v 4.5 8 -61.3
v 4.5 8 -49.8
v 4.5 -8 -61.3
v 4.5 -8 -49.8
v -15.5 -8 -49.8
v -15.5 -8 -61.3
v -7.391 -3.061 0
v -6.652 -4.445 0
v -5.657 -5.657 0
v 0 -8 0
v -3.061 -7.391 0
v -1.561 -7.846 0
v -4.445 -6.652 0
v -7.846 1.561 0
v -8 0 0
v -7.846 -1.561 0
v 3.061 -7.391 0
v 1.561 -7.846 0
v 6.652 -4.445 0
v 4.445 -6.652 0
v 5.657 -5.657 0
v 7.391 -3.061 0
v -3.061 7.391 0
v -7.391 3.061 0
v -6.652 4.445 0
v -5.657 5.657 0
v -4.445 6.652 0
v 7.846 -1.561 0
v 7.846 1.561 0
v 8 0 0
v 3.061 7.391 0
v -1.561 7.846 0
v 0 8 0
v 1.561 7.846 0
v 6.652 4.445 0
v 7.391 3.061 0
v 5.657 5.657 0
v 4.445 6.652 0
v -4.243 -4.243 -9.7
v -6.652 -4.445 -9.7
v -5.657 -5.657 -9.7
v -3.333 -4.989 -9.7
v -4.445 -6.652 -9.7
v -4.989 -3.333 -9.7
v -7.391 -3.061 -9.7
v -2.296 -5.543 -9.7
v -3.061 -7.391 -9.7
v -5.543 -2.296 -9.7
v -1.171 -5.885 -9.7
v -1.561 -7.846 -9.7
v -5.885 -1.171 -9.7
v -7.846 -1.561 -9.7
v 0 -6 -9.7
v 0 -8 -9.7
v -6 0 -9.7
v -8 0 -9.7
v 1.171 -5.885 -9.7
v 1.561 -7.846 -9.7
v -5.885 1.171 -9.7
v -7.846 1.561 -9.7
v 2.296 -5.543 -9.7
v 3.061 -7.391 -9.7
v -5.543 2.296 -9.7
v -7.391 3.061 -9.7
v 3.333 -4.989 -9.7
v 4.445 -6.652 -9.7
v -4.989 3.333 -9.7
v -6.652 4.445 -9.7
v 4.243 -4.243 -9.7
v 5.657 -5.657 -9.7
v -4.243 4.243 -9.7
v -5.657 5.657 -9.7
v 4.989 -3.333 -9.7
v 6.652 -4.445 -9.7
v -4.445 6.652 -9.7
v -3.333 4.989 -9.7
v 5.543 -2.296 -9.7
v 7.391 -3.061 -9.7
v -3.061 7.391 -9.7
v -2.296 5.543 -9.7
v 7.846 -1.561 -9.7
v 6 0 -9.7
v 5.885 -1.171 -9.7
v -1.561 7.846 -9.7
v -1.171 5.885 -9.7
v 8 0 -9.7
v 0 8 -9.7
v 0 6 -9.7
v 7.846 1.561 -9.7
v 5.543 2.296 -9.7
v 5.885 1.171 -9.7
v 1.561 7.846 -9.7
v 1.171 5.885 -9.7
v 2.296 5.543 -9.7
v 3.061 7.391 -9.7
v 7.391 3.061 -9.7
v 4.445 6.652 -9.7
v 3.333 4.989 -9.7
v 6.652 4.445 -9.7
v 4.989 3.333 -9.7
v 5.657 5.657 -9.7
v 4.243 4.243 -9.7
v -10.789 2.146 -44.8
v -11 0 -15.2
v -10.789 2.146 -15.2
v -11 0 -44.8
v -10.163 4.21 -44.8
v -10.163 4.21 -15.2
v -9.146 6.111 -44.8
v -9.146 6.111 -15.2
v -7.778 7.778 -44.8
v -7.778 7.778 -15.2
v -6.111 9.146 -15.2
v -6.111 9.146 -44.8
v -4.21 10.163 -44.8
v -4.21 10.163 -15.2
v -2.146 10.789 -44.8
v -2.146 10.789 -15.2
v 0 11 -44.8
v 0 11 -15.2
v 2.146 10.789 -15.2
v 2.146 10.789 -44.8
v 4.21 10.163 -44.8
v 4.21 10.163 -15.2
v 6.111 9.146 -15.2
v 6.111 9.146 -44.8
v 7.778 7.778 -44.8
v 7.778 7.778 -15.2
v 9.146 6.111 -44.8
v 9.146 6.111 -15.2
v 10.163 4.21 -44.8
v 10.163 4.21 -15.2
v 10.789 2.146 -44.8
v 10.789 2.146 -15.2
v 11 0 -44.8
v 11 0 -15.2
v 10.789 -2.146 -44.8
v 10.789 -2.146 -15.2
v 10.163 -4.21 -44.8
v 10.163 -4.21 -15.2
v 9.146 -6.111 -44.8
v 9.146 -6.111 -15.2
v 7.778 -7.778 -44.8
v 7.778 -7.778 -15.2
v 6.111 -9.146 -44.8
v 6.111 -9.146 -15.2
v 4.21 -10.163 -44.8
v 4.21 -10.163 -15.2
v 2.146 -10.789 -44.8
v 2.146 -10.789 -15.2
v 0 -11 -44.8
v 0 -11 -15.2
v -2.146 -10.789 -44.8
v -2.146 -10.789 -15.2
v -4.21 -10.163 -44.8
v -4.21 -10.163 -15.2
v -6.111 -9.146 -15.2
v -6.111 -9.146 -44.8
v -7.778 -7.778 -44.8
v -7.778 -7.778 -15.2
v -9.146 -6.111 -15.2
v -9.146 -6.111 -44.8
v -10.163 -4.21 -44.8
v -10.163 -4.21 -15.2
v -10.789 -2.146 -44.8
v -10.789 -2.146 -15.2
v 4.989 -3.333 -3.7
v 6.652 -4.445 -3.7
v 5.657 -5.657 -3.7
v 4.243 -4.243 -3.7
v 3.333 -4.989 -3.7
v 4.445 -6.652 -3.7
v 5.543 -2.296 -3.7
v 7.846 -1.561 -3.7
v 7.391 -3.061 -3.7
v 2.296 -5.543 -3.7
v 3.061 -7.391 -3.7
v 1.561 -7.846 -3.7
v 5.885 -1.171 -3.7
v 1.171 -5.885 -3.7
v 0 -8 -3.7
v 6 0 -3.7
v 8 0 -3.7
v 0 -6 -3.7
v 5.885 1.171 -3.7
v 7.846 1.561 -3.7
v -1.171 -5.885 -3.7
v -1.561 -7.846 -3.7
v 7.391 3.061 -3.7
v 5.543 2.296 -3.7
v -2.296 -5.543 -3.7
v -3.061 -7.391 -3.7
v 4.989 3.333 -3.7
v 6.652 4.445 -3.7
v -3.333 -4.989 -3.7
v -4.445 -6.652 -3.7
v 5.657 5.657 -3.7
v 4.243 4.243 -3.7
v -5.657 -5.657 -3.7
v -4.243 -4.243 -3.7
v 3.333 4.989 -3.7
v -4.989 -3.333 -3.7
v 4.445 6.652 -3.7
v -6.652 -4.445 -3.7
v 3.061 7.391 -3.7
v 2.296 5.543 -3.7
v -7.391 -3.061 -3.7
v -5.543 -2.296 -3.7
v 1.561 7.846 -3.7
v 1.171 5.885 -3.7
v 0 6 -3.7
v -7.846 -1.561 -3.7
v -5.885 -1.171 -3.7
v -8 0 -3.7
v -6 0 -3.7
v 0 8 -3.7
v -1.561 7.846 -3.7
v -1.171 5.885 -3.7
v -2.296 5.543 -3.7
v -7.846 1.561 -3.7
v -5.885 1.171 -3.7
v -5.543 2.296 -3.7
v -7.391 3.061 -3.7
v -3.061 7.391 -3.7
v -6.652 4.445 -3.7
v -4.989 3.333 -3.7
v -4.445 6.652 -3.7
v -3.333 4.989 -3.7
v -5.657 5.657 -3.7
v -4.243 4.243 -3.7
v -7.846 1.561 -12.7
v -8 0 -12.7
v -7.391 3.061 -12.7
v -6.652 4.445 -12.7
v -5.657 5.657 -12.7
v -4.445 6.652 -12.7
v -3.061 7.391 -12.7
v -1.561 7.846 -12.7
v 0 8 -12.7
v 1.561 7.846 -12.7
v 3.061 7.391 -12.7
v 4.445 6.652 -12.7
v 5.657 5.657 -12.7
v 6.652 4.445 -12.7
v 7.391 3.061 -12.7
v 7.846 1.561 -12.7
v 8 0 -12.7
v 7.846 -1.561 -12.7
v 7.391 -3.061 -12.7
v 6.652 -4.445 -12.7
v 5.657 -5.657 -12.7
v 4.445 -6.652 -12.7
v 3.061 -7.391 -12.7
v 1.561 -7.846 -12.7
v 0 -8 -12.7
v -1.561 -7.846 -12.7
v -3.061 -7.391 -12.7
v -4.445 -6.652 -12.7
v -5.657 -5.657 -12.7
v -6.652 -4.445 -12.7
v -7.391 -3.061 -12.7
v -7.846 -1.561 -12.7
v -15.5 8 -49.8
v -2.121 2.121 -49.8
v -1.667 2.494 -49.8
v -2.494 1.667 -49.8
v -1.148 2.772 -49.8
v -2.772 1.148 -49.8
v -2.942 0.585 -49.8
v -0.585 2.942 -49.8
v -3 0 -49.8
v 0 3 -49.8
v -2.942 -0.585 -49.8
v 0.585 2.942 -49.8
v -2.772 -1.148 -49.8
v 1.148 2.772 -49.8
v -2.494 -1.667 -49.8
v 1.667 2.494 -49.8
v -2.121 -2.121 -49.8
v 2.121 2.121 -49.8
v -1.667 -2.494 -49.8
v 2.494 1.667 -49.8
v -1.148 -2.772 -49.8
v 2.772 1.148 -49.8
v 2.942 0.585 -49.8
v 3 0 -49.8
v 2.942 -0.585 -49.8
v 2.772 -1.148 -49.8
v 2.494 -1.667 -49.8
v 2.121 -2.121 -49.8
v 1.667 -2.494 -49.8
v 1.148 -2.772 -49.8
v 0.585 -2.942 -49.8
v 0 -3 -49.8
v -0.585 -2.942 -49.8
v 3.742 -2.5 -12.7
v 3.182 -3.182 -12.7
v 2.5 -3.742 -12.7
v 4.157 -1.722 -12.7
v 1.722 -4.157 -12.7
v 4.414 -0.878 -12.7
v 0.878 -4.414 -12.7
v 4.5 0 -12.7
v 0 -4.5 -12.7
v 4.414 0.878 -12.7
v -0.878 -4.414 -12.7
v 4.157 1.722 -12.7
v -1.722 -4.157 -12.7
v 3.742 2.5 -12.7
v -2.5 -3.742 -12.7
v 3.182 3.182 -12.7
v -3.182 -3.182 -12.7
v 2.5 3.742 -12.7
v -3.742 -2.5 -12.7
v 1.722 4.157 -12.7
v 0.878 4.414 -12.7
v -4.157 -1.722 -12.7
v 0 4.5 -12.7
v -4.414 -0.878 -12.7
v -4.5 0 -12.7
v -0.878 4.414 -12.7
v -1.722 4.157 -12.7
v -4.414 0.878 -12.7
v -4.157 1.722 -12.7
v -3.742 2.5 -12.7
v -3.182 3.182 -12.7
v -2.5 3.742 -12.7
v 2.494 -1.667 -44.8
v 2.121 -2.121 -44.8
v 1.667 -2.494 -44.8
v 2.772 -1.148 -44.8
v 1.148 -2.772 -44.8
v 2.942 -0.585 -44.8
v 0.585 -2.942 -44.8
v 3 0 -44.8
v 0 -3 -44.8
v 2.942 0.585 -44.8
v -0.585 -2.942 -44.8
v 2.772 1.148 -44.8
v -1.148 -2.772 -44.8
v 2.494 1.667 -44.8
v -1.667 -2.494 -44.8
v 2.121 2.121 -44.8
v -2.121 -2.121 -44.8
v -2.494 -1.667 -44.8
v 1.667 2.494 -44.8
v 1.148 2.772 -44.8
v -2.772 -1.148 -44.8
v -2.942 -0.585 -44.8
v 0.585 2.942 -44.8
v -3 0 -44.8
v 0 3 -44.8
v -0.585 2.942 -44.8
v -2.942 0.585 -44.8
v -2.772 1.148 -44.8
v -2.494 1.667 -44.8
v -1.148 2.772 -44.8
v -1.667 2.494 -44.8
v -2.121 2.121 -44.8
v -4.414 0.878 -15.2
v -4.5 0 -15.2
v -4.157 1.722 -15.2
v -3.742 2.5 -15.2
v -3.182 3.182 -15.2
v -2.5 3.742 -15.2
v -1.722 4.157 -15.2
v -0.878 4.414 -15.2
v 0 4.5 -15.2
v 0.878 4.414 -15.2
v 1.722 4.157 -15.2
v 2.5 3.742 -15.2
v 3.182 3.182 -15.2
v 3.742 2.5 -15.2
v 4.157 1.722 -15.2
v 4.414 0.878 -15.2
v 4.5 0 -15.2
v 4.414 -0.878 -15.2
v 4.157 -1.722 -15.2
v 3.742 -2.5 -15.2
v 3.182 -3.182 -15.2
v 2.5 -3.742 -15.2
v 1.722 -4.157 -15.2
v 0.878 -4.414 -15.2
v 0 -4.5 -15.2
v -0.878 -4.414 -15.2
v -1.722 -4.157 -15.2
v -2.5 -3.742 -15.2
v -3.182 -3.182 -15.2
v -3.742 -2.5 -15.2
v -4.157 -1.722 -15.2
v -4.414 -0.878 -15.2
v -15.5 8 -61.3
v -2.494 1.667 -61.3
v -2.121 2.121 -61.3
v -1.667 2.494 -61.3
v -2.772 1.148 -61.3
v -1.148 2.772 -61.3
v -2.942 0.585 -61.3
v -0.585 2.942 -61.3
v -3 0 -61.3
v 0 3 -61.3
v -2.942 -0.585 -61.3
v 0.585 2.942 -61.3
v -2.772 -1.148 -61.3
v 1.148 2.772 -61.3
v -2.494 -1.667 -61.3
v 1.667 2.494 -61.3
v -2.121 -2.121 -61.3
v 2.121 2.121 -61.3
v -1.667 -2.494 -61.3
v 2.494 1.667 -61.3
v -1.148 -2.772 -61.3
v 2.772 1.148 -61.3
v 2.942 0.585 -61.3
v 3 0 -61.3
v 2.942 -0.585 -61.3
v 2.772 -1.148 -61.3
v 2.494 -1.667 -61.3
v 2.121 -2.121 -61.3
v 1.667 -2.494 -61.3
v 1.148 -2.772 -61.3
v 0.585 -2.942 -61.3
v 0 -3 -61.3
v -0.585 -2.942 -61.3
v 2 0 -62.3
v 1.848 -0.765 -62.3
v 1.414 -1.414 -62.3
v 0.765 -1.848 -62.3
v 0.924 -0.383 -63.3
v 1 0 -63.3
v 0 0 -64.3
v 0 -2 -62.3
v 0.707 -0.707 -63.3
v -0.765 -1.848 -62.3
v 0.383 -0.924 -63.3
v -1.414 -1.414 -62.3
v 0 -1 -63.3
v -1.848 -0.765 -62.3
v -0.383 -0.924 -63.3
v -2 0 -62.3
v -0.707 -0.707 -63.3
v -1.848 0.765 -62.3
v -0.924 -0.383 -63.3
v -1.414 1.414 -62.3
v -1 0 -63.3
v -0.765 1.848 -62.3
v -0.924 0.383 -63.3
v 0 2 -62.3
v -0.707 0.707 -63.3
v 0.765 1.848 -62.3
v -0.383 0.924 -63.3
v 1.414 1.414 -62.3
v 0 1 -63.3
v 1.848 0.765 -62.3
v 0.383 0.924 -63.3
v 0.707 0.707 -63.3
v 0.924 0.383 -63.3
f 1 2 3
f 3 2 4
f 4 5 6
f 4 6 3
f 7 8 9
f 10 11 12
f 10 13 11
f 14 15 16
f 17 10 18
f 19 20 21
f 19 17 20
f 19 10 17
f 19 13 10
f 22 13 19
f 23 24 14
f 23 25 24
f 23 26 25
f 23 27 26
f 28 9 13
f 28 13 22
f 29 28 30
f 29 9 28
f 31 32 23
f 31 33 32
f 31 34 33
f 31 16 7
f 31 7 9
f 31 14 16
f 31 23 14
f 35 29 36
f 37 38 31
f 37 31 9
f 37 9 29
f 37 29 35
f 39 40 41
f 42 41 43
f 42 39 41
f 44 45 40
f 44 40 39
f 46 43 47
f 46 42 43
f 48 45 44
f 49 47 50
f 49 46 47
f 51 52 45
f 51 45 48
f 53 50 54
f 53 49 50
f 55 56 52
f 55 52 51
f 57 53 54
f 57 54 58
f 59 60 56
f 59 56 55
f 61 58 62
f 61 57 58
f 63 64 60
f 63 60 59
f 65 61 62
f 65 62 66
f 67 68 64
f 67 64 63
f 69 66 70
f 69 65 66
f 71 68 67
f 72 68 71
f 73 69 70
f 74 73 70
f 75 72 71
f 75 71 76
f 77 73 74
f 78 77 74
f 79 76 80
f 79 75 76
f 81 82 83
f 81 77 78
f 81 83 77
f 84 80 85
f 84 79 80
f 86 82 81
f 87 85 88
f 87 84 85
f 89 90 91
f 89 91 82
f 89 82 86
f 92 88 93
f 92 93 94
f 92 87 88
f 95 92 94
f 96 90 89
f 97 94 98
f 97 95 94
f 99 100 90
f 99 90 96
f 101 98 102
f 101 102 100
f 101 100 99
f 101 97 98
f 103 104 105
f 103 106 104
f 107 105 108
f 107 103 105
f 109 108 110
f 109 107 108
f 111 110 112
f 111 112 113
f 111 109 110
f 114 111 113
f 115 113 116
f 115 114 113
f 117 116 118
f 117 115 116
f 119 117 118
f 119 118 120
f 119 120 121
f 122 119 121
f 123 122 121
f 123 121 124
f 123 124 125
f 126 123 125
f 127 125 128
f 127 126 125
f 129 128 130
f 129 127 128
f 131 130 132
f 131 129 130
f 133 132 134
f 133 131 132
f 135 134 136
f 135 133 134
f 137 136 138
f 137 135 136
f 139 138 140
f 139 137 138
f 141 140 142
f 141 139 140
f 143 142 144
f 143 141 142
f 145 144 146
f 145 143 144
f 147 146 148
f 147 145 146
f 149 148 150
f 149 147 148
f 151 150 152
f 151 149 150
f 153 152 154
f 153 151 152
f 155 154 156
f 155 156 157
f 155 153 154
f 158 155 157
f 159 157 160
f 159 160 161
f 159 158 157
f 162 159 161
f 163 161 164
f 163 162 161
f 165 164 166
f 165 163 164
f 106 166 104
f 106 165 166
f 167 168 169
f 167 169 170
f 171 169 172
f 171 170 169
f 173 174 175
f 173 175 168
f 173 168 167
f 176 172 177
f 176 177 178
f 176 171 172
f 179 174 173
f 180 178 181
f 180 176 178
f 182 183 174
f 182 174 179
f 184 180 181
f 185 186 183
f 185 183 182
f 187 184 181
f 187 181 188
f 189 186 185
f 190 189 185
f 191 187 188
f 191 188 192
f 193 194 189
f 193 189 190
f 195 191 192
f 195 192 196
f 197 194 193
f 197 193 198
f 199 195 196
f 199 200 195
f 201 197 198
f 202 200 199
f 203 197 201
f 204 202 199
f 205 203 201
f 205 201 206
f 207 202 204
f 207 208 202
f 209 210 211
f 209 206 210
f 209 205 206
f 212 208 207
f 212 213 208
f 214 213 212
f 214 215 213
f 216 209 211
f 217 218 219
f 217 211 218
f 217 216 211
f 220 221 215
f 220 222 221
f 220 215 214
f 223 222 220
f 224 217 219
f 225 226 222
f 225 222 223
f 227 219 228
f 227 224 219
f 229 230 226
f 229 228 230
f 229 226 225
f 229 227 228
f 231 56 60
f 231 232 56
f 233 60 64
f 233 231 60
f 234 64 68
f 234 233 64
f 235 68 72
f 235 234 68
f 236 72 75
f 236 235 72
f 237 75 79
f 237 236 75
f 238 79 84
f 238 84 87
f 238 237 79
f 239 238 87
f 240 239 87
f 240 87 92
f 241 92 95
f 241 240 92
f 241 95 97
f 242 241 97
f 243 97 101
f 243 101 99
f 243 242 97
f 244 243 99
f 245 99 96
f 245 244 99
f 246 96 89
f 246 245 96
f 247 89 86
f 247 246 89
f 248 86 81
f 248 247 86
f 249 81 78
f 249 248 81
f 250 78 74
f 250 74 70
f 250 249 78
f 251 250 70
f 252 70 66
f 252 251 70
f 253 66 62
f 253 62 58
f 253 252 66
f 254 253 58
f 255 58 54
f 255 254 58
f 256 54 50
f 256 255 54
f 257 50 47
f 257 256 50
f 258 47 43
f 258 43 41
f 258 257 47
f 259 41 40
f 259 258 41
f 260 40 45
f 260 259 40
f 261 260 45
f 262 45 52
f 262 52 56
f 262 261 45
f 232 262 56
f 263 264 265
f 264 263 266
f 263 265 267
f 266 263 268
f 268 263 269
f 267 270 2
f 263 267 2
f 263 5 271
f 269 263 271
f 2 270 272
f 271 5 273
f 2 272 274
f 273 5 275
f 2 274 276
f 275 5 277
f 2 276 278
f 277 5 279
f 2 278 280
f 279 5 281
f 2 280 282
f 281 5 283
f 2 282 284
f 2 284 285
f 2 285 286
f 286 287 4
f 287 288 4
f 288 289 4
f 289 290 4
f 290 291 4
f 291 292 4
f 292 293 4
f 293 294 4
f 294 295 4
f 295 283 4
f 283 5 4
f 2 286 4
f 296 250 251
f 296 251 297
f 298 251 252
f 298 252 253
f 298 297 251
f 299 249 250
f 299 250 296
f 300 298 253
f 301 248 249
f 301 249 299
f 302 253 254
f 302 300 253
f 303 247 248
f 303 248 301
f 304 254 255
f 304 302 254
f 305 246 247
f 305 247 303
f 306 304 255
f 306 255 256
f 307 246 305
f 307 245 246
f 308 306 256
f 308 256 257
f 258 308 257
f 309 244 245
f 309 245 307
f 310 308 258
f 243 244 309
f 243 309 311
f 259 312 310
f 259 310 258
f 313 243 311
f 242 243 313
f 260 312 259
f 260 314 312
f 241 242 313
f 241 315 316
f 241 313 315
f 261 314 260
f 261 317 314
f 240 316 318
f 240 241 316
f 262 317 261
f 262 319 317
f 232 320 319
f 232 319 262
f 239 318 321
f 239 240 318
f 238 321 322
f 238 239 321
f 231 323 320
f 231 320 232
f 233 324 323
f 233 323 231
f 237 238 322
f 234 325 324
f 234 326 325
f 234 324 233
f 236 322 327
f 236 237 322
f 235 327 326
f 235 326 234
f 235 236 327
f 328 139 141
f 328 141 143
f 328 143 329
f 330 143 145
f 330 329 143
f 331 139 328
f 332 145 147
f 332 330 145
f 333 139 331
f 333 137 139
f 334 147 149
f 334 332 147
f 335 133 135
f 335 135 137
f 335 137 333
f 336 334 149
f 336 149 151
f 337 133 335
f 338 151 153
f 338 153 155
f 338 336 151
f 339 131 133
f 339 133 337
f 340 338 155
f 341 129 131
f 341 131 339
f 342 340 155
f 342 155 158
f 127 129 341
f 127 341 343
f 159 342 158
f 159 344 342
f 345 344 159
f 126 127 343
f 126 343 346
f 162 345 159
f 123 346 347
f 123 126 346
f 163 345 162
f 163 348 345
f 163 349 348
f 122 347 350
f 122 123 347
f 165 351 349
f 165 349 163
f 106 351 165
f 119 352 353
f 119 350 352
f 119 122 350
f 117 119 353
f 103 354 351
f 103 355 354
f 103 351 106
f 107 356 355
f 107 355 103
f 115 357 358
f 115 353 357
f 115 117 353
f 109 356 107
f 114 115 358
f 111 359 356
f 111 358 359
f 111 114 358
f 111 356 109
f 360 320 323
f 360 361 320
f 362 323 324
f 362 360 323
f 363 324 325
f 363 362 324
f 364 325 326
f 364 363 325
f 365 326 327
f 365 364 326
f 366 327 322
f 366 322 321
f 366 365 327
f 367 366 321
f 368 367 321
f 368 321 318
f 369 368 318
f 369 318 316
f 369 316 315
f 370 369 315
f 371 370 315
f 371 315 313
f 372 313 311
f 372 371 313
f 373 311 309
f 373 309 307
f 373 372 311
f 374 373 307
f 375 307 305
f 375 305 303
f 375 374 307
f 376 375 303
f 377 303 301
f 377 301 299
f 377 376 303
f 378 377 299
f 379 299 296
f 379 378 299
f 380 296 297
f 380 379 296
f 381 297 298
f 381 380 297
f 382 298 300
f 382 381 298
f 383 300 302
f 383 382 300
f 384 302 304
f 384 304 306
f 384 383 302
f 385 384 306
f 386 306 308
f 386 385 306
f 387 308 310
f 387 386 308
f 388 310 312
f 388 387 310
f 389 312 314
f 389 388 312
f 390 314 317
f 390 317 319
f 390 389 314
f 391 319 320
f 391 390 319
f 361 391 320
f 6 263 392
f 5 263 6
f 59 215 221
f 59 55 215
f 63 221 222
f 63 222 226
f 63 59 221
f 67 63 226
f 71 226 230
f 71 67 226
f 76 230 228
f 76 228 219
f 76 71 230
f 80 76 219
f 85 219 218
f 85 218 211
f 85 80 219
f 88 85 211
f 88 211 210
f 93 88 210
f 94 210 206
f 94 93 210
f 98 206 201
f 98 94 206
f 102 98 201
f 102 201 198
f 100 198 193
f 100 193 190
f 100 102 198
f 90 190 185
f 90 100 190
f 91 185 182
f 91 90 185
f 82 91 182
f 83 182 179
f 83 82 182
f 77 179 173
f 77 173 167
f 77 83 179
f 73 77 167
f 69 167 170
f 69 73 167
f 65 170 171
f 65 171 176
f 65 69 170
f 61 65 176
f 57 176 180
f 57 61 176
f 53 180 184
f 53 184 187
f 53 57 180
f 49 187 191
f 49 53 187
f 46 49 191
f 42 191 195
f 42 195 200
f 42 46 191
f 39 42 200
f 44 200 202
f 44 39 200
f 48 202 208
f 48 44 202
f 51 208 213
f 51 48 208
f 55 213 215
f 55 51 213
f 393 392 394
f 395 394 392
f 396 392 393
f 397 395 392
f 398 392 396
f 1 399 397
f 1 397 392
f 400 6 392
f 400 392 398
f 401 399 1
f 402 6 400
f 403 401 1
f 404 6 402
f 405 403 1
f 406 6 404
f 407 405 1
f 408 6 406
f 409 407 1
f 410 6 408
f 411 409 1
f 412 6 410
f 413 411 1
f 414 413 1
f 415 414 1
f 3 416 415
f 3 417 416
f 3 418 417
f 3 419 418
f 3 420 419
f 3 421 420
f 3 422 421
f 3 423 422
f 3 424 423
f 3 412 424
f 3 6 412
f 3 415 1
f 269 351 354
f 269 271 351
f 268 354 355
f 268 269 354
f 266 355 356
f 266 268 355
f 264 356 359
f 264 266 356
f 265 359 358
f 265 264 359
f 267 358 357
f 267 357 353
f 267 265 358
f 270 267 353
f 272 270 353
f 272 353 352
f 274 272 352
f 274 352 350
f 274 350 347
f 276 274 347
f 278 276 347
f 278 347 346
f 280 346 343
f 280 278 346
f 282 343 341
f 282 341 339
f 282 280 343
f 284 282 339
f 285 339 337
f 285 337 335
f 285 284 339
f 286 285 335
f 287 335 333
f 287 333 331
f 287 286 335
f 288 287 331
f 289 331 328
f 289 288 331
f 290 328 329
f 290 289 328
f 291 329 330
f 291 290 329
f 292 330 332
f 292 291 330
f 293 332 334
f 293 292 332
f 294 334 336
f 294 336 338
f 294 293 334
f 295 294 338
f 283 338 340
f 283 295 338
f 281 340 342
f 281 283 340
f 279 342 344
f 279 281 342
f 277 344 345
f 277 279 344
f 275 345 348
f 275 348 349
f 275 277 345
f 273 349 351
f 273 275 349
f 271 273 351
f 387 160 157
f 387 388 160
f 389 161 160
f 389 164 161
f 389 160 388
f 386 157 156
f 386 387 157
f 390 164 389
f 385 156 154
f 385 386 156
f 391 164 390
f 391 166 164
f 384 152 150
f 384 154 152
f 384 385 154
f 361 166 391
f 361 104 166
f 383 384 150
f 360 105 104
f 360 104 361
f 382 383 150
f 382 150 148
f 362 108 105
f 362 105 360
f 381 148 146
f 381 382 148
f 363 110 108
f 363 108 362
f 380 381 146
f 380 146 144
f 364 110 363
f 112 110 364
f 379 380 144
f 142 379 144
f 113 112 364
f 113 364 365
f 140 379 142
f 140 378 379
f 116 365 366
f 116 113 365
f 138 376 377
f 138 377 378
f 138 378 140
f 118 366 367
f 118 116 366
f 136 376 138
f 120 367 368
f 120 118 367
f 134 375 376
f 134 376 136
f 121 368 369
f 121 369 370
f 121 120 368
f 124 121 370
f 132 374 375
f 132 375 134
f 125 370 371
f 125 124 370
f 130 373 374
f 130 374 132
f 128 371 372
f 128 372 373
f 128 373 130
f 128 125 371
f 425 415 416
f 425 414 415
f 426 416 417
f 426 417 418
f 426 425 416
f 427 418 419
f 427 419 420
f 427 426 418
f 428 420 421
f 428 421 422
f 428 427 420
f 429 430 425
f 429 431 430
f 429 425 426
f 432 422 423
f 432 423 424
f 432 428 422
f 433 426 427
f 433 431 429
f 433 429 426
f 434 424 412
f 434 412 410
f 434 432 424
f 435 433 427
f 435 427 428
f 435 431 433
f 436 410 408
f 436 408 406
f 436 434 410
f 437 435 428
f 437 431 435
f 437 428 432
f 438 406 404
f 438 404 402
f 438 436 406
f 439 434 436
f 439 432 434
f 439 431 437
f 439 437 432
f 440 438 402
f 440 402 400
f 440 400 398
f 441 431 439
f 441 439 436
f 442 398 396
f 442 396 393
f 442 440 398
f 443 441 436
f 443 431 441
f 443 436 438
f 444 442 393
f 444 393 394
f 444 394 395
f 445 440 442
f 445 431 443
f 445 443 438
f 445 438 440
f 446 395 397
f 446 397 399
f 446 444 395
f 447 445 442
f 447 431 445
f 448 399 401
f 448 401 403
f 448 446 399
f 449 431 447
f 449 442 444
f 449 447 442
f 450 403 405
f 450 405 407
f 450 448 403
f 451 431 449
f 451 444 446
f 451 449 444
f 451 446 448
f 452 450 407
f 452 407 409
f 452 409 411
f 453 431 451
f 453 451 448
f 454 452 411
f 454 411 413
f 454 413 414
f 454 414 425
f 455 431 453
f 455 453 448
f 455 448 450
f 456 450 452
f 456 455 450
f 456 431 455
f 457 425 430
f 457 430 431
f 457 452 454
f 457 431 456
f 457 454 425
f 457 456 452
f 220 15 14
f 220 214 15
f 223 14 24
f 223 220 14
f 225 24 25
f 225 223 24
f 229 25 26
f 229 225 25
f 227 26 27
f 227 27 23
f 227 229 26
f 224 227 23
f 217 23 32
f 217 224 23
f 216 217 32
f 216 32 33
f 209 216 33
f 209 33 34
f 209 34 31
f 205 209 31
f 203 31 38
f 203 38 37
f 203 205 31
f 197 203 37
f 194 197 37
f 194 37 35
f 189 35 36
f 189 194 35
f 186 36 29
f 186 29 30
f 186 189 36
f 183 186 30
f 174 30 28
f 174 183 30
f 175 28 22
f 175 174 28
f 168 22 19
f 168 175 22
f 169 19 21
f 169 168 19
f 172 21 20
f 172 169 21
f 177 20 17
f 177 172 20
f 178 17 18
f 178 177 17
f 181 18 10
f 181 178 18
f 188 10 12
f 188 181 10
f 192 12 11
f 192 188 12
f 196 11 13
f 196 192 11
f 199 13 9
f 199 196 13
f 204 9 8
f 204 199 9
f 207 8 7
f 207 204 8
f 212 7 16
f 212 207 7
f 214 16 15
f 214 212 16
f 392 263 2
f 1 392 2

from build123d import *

# Parameters (mm, degrees)
F2_W     = 20
F2_H     = 16
F3_DEPTH = 11.5
F4_R     = 3


# Not quite as in the source:
# - an extrude whose draft closes it to a point is written as a loft to that point


with BuildPart() as f1:
    # F0 (on Front) → F1 (revolve)
    with BuildSketch(Plane.XZ):
        Polygon((0, -49.8), (0, 0), (-8, 0), (-8, -3.7), (-6, -3.7), (-6, -9.7), (-8, -9.7), (-8, -12.7), (-4.5, -12.7), (-4.5, -15.2), (-11, -15.2), (-11, -44.8), (-3, -44.8), (-3, -49.8), align=None)
    revolve(axis=Axis((0, 0, -24.9), (0, 0, -1)))

    # F2 (on face) → F3 (join)
    with BuildSketch(Plane(origin=(0, 0, -49.8), x_dir=(1, 0, 0), z_dir=(0, 0, -1))):
        with Locations((-5.5, 0)):
            Rectangle(F2_W, F2_H)
    extrude(amount=F3_DEPTH)

    # F4 (on face) → F5 section 0
    with BuildSketch(Plane(origin=(0, 0, -61.3), x_dir=(1, 0, 0), z_dir=(0, 0, -1)), mode=Mode.PRIVATE) as f5_s0:
        Circle(F4_R)
    loft([f5_s0.sketch, Vertex(0, 0, -64.3)], ruled=True)


solid = f1.part
